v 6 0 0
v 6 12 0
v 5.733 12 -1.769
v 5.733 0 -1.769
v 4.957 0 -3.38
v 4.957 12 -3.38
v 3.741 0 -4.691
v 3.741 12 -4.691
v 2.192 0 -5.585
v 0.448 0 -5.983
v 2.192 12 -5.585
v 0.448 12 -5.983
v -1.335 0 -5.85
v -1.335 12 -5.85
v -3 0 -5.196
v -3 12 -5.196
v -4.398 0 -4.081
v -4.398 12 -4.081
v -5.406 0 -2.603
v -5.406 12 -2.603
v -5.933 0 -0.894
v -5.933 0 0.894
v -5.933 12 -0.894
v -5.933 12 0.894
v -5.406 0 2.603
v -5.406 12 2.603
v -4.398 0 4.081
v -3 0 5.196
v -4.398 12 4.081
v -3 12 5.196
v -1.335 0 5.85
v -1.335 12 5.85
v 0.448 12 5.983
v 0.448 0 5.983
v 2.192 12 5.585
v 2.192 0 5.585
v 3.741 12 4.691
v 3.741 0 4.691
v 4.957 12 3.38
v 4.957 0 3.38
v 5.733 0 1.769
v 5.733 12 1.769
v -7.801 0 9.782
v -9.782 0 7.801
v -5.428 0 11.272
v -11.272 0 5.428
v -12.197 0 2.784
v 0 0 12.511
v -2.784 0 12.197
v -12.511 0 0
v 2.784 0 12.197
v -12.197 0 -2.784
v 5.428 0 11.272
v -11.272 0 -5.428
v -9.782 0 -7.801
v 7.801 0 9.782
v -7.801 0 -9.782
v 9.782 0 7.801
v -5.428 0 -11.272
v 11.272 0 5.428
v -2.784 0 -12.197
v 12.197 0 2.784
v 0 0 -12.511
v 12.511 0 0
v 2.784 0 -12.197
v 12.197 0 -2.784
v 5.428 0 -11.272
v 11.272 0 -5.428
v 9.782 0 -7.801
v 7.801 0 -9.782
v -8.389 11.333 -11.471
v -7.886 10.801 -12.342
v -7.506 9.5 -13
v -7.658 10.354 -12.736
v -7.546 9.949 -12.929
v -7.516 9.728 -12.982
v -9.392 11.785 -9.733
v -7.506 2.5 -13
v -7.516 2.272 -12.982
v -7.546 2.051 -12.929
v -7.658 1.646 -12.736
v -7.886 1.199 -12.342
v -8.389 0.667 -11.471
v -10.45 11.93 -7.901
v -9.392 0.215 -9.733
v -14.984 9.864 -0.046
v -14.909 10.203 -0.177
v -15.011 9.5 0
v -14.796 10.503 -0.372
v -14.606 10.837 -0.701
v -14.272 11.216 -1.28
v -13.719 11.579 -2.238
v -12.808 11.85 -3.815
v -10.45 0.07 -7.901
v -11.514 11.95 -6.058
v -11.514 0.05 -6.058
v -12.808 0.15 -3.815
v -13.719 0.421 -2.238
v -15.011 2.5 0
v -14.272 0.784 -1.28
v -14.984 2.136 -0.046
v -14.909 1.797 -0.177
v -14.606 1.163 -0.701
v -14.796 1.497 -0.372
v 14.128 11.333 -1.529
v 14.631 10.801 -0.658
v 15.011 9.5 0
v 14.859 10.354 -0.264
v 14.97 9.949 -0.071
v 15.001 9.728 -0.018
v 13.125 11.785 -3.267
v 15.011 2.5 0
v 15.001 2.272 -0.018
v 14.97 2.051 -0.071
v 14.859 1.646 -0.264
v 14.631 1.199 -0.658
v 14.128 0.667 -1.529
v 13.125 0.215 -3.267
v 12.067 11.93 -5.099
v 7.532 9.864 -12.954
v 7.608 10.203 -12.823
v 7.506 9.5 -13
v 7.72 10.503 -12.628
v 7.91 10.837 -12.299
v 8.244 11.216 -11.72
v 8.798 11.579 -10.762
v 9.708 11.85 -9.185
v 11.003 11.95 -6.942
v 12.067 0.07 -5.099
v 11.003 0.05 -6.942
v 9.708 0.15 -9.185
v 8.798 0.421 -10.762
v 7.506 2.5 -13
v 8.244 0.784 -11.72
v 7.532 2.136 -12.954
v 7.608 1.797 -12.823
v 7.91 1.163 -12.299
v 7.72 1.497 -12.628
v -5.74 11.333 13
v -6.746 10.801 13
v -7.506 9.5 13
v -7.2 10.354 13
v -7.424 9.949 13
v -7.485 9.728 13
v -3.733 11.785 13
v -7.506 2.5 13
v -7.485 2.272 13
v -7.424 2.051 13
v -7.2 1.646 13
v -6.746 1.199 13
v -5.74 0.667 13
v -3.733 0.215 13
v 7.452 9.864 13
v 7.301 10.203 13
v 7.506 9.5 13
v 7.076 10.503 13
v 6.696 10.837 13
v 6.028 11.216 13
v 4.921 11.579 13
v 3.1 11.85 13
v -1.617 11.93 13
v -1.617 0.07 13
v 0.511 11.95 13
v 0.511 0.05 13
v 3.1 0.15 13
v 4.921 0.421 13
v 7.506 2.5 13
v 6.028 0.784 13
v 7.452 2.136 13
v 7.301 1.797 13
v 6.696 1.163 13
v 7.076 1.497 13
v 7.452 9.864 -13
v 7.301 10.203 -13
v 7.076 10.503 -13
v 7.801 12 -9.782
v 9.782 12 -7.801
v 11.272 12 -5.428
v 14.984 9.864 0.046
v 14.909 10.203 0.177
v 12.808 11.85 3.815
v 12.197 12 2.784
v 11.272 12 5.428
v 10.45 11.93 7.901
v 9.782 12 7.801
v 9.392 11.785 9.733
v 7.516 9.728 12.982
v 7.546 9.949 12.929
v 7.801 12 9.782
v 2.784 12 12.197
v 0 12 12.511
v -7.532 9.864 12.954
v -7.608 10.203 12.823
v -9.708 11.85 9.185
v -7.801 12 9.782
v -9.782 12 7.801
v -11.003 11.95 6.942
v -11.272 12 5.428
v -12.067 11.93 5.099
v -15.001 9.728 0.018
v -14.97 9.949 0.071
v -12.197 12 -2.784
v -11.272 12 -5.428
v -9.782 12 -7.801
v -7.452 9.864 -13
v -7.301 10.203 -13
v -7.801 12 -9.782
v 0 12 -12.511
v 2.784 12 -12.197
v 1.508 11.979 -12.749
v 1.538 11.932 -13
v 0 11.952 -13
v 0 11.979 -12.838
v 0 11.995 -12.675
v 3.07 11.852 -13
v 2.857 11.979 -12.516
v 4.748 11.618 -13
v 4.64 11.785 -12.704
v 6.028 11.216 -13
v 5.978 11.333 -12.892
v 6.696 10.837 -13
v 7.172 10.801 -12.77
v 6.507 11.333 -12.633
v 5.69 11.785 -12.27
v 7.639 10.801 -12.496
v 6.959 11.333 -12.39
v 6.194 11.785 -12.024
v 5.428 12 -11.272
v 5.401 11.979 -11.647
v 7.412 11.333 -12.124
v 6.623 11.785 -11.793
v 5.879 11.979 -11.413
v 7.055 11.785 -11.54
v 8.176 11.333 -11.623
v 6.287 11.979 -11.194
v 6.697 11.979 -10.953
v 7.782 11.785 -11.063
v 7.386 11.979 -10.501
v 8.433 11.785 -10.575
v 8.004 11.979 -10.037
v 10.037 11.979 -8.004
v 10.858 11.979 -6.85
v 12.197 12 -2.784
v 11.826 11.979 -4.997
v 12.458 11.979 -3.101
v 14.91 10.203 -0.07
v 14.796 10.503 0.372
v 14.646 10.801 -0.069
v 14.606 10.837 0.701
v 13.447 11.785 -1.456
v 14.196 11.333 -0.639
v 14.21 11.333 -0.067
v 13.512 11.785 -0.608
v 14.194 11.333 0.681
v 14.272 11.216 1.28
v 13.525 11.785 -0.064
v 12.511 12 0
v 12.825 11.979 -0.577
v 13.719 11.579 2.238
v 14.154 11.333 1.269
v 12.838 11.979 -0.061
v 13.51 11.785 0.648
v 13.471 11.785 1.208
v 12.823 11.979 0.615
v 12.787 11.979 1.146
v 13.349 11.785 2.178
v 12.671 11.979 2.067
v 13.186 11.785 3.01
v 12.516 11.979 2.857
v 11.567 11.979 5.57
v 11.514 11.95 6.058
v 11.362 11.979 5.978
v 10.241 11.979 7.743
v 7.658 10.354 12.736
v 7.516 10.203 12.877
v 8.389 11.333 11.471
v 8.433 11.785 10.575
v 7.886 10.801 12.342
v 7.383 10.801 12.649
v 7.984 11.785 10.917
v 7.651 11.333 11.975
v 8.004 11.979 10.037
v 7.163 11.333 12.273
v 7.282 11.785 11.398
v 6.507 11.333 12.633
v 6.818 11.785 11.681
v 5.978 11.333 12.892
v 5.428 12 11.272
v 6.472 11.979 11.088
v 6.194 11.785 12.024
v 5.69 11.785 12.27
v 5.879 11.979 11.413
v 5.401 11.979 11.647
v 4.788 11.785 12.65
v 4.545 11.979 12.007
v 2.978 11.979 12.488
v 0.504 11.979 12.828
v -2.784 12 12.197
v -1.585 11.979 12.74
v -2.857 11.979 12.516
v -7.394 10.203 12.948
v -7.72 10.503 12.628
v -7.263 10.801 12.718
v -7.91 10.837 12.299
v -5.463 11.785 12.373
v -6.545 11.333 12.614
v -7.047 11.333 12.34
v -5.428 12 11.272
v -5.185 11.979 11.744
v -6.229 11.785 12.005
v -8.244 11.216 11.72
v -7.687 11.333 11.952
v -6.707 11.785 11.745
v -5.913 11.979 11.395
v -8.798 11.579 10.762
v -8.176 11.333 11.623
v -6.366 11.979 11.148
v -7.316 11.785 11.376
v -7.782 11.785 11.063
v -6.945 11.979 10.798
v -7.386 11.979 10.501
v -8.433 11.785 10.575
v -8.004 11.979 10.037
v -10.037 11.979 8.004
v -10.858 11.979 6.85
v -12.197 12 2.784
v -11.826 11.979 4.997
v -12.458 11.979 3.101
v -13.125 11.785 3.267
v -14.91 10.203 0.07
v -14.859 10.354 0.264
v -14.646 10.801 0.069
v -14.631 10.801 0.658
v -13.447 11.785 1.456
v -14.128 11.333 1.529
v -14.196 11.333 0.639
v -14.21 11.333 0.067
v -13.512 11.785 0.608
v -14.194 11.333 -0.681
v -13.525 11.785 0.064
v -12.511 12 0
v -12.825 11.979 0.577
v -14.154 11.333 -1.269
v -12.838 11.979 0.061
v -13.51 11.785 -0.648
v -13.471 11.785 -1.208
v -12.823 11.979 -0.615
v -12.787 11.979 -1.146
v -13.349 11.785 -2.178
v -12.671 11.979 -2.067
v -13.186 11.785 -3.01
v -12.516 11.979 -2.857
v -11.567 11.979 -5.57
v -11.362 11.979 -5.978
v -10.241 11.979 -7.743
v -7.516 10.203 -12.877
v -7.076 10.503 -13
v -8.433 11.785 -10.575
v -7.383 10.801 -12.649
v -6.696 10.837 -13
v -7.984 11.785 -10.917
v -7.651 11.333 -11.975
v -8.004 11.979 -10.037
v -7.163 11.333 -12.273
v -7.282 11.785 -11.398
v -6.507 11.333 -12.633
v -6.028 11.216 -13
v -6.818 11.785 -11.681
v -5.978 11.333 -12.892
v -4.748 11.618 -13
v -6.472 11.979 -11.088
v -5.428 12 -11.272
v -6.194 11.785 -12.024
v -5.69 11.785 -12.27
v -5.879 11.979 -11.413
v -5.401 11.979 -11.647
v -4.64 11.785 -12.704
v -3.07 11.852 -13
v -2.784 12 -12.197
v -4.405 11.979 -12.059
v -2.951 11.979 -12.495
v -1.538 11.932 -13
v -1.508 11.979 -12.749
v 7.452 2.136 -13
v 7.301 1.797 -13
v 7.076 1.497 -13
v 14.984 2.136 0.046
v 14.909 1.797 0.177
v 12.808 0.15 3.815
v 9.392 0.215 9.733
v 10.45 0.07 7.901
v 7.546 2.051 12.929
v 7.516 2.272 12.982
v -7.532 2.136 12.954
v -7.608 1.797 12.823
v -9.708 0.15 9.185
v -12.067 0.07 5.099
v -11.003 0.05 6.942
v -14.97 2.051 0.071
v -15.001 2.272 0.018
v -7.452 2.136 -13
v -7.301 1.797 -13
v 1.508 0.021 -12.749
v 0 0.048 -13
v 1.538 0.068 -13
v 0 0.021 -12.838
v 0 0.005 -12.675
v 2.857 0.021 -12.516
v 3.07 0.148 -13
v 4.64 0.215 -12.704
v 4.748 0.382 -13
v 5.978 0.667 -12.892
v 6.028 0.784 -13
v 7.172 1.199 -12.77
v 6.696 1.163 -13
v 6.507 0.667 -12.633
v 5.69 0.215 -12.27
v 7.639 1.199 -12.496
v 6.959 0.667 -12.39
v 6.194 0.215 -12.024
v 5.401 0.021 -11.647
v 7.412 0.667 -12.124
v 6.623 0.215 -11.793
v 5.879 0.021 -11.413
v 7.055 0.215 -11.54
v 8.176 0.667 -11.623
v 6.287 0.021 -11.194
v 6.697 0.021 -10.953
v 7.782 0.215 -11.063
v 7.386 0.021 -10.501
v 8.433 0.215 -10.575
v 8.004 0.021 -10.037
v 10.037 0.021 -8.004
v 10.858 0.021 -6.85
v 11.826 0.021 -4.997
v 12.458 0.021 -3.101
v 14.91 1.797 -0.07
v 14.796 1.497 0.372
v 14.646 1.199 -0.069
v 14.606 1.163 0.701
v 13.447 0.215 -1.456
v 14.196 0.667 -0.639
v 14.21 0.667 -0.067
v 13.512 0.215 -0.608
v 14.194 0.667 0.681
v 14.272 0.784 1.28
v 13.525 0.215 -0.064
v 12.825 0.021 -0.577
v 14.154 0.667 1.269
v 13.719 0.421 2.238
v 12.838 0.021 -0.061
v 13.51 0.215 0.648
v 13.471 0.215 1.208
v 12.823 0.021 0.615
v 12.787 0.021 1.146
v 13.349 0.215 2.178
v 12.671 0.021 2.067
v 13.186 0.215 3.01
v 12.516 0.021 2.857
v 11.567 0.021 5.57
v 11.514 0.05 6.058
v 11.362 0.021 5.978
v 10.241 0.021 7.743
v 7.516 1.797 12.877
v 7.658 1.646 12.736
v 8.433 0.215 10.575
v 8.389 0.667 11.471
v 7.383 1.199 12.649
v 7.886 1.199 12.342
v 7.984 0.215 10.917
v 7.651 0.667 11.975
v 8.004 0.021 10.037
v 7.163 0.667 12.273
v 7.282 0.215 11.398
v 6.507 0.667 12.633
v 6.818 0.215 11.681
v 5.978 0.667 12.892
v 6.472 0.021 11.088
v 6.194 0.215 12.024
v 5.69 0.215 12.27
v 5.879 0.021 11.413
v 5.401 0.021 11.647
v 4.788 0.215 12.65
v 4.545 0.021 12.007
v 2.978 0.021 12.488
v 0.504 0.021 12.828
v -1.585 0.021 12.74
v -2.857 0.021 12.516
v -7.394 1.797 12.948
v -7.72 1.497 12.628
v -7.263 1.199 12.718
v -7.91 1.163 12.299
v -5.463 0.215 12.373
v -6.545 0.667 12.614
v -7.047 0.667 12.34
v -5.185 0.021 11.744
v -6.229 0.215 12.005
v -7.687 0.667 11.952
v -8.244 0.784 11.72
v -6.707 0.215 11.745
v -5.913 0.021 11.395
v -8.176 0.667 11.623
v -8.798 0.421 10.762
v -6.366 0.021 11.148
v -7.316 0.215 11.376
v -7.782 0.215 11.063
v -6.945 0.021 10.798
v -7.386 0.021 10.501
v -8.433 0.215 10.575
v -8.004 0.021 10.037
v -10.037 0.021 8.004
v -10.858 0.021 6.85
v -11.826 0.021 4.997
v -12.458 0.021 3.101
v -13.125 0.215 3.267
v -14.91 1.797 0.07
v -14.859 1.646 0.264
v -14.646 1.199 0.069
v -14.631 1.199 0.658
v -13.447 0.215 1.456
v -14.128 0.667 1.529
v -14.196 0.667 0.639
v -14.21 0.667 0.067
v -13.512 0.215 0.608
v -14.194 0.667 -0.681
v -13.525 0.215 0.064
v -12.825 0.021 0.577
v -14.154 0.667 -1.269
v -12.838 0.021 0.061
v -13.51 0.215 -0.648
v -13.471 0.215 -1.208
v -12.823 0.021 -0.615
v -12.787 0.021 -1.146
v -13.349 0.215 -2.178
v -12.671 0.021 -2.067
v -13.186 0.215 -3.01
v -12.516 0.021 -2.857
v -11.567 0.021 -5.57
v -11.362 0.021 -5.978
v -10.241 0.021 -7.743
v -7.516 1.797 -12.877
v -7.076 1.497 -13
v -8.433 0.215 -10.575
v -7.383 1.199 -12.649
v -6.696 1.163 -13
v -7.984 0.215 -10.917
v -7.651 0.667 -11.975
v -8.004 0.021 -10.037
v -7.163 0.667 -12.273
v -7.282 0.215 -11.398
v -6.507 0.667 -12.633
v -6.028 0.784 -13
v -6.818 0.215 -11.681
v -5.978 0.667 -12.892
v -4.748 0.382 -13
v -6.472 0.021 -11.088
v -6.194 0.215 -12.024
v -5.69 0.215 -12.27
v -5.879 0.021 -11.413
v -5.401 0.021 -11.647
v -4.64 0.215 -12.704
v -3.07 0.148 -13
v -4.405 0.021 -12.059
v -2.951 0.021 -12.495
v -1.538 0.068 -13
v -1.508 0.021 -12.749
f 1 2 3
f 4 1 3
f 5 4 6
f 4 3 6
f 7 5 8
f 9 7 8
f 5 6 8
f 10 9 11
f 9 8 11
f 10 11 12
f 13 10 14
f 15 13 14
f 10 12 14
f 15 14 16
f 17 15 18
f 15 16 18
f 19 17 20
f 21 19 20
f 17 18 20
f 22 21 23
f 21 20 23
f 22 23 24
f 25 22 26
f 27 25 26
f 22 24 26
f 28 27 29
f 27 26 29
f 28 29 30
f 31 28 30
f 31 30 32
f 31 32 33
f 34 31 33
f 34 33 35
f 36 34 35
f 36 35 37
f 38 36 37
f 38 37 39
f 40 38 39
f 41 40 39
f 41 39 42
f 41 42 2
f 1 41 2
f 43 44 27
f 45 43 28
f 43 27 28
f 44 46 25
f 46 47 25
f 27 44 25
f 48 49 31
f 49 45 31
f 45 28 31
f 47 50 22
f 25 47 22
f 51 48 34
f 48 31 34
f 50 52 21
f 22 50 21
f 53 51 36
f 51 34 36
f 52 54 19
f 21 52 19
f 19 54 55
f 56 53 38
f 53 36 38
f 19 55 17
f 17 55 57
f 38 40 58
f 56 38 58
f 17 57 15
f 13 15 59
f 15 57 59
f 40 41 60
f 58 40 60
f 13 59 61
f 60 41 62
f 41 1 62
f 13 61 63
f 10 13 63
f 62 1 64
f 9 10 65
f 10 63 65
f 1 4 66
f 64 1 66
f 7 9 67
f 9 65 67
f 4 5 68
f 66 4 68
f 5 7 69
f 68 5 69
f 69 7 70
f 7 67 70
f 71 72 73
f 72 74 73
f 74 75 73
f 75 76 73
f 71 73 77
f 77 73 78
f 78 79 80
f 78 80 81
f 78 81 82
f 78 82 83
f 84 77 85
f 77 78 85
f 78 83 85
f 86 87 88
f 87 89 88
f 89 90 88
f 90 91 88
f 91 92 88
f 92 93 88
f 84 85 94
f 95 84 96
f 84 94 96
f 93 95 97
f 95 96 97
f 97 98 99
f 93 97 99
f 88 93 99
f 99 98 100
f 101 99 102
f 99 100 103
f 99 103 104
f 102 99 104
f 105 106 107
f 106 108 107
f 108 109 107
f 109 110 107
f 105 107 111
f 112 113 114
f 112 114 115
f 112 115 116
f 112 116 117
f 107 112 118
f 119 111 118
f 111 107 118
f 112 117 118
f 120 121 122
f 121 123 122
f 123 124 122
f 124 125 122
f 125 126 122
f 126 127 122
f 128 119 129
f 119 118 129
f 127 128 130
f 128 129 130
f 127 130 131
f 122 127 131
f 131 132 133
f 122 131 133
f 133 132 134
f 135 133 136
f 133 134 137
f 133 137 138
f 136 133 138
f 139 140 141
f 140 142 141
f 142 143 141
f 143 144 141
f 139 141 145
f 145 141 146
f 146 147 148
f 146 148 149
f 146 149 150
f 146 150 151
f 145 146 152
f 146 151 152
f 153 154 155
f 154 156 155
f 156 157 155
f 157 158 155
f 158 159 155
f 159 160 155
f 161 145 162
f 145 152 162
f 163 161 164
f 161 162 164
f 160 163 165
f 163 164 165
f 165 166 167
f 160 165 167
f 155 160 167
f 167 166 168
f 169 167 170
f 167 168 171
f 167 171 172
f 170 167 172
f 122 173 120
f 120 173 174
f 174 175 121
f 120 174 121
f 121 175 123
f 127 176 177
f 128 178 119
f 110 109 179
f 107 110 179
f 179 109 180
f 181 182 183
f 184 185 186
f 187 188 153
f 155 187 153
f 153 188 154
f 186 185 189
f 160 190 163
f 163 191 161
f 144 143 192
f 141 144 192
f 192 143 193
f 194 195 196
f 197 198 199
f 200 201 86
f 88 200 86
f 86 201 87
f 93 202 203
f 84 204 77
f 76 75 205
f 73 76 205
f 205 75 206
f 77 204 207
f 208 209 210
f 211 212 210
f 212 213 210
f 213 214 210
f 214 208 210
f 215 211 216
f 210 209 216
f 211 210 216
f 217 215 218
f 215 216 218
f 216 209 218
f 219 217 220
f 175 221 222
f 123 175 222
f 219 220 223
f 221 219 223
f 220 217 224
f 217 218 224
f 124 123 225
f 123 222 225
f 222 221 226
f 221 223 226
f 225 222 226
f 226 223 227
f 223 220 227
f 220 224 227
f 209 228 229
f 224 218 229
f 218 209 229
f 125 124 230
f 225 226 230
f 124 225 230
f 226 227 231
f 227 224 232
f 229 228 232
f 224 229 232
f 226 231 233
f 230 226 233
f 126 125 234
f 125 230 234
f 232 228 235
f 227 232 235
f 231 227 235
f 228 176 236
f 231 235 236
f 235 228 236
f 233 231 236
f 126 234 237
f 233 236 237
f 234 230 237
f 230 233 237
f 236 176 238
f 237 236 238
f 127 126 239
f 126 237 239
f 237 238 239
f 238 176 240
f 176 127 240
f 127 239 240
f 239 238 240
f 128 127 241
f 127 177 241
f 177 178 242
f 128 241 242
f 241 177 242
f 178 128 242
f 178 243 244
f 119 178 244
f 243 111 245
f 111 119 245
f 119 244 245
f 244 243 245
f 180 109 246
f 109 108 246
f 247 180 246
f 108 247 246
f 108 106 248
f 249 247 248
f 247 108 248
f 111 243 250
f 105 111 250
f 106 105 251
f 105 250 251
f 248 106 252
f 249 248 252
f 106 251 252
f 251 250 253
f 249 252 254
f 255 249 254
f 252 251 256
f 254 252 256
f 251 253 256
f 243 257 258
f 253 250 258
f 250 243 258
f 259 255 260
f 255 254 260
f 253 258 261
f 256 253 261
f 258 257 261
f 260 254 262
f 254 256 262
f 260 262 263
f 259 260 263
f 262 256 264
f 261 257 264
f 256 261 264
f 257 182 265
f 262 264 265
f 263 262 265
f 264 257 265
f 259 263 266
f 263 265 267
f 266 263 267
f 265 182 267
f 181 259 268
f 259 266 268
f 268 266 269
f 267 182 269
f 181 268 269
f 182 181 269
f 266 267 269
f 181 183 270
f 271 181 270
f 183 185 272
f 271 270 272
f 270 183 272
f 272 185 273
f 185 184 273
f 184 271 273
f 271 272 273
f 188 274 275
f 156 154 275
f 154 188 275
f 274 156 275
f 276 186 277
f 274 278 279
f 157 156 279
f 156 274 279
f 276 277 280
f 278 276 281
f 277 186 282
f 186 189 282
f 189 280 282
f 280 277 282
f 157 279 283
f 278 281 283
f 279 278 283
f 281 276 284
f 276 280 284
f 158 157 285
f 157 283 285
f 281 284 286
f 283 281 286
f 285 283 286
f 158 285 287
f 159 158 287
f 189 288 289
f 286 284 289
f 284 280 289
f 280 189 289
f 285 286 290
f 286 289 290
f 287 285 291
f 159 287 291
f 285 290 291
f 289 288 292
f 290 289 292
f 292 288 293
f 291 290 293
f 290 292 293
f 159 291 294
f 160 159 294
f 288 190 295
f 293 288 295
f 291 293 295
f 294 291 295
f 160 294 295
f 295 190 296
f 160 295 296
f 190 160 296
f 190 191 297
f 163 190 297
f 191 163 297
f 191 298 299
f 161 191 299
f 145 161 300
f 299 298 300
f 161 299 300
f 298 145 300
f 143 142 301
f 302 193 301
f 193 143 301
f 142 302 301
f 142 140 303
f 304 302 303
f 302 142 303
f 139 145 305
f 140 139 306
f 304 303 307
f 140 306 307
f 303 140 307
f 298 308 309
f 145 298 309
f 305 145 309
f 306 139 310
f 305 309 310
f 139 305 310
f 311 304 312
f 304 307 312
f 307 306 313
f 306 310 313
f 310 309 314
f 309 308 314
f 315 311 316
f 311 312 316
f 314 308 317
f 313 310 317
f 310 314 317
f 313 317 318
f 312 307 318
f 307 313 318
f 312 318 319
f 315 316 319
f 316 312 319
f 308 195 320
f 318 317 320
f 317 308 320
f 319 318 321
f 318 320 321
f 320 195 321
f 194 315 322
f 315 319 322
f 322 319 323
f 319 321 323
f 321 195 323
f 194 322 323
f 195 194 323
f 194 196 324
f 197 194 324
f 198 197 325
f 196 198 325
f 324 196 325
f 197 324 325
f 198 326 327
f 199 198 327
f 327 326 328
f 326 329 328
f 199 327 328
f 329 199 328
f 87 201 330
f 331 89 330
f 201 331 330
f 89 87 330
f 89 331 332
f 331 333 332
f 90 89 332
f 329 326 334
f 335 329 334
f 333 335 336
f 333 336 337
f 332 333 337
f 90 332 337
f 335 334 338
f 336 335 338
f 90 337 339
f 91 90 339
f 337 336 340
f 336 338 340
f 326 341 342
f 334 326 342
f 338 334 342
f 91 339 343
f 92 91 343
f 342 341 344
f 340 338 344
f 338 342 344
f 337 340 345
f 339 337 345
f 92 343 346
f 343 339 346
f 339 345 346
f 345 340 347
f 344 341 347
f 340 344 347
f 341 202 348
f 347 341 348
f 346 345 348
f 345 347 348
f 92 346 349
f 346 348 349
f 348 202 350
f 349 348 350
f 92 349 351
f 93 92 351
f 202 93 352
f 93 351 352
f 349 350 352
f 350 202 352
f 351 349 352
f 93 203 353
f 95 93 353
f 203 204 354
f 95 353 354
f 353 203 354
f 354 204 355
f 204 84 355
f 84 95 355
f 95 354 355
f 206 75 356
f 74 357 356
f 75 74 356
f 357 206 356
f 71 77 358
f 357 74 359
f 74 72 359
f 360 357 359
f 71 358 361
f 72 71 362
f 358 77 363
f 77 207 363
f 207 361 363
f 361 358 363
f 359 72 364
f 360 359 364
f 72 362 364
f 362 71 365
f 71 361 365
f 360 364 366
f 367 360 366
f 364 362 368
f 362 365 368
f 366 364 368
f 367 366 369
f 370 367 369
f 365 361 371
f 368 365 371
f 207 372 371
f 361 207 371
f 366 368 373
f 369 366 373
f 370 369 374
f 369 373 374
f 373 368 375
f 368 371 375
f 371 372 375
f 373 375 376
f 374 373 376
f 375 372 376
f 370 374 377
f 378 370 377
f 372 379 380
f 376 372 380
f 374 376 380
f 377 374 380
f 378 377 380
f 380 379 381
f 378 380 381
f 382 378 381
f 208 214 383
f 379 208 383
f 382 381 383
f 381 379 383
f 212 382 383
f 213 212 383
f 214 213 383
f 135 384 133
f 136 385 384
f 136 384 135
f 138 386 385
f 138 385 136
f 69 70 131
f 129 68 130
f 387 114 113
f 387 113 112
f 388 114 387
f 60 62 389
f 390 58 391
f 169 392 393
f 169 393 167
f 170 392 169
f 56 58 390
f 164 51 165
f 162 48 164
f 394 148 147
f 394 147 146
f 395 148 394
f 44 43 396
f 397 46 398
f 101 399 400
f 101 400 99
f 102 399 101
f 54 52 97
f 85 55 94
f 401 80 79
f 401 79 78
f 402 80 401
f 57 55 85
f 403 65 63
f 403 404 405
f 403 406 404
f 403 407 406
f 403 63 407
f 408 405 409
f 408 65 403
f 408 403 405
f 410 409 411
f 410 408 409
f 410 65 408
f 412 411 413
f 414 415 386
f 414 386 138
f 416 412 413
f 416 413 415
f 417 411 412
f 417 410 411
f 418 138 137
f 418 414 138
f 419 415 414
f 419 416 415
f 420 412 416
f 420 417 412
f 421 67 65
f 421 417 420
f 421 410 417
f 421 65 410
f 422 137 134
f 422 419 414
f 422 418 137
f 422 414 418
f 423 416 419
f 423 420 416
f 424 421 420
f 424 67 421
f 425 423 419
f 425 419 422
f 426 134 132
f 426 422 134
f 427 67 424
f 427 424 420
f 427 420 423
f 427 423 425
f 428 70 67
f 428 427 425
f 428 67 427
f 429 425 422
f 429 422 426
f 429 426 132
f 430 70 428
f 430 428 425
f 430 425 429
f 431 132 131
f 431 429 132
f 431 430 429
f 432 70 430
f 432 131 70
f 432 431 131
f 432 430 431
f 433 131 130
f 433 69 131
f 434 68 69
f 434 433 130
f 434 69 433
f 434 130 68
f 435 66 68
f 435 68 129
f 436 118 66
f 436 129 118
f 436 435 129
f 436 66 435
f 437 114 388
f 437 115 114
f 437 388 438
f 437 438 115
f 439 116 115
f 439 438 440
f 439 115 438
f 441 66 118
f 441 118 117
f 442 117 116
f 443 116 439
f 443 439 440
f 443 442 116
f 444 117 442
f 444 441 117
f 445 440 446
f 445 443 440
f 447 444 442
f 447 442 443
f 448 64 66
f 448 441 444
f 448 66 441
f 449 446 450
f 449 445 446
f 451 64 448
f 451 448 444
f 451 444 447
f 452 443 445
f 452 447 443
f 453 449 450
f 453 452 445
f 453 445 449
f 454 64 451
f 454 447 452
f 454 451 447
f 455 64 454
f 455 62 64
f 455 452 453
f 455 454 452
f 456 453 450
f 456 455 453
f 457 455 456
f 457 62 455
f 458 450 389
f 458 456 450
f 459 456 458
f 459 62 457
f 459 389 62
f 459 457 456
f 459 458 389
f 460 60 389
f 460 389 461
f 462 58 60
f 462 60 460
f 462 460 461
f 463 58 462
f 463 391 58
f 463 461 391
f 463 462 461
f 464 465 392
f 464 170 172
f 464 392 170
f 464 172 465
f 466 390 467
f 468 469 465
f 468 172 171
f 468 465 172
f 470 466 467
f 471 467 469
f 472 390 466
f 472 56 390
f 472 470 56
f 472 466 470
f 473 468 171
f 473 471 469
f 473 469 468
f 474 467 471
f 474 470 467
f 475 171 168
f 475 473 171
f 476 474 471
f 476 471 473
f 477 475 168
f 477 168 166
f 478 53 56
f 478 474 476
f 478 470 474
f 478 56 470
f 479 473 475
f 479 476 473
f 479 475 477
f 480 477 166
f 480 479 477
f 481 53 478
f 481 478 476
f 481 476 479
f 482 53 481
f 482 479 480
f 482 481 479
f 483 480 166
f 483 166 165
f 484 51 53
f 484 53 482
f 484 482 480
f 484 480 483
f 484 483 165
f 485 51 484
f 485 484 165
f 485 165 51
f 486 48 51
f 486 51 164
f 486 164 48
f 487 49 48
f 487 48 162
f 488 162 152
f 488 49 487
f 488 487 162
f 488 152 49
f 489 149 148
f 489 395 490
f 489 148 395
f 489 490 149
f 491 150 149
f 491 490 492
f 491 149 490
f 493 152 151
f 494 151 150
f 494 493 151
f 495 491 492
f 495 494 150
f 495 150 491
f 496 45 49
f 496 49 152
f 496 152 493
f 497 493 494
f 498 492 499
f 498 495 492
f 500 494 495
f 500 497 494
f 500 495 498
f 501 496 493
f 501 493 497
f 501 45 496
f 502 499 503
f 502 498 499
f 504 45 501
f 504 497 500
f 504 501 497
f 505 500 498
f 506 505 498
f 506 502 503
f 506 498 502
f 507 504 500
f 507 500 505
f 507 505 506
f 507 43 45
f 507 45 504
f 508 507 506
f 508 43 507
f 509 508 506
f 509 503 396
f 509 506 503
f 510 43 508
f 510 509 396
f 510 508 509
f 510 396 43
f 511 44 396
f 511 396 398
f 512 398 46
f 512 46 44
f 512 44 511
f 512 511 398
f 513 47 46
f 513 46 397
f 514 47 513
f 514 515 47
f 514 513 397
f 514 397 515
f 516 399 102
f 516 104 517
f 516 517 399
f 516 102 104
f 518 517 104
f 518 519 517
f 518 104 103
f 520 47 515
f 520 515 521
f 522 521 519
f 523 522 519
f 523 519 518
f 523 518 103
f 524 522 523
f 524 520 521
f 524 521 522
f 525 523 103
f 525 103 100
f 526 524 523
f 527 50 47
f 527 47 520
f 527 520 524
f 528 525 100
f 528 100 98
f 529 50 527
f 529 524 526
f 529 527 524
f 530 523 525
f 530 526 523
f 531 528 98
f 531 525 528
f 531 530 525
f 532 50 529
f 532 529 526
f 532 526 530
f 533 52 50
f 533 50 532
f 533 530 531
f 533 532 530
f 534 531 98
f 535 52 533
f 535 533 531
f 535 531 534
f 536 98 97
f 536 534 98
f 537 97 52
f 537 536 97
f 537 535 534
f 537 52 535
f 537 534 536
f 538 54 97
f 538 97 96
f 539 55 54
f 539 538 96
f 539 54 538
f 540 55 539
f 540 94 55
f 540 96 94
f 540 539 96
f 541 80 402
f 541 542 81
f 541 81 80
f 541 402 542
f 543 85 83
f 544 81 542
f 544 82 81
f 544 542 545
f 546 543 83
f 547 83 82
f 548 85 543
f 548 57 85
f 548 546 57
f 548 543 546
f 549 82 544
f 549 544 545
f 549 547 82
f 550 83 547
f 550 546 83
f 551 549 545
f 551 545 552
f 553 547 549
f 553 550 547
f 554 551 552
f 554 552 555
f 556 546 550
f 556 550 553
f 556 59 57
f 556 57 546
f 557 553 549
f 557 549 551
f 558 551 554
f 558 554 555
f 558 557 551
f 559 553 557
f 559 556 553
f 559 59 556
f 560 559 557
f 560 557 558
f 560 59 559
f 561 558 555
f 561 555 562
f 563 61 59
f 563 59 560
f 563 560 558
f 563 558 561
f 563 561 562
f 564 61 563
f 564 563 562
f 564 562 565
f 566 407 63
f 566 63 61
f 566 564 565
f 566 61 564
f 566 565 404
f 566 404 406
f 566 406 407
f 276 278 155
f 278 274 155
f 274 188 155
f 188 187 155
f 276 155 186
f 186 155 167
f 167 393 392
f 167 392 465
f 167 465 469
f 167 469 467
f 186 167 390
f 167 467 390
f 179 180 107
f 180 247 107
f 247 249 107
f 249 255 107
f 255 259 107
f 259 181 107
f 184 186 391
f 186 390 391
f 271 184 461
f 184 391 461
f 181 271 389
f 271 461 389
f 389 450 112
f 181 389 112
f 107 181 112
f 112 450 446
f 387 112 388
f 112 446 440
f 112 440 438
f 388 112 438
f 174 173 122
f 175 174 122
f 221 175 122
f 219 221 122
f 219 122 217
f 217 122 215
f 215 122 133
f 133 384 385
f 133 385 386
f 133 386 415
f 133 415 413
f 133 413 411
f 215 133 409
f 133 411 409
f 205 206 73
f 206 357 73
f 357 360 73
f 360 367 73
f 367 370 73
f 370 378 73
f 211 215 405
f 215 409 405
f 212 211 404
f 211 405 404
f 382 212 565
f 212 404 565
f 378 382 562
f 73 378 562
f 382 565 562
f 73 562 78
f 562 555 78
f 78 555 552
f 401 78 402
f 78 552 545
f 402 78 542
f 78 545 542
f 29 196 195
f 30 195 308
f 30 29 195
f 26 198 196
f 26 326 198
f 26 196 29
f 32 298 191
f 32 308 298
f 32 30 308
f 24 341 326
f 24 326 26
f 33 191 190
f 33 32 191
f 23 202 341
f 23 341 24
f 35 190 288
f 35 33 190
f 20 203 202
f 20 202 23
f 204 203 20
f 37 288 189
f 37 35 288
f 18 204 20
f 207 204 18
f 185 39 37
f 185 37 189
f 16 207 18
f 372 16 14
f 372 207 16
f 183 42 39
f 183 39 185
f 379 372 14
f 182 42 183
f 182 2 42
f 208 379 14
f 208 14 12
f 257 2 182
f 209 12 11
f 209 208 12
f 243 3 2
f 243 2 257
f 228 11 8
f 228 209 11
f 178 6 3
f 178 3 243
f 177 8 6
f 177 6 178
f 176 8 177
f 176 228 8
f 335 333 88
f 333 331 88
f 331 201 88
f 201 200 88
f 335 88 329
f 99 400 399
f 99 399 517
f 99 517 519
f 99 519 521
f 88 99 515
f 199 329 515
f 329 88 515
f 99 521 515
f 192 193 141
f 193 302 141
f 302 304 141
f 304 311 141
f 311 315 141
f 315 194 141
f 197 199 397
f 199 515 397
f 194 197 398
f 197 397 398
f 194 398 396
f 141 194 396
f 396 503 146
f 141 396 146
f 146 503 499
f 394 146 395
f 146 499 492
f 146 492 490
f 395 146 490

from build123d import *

# Parameters (mm, degrees)
BOSS_EXTRUDE1_DEPTH    = 12
F_12_0MM_DOWEL_HOLE1_D = 12


with BuildPart() as part:
    # Sketch1 → Boss-Extrude1 (new body)
    with BuildSketch(Plane(origin=(0, 0, 0), x_dir=(1, 0, 0), z_dir=(0, 1, 0))):
        Polygon((7.505553499, 13), (-7.505553499, 13), (-15.011106999, 0), (-7.505553499, -13), (7.505553499, -13), (15.011106999, 0), align=None)
    extrude(amount=BOSS_EXTRUDE1_DEPTH)

    # Ø12.0mm Dowel Hole1 (through all)
    with Locations(Plane(origin=(0, 0, 0), x_dir=(-1, 0, 0), z_dir=(0, -1, 0))):
        with Locations((0, 0)):
            Hole(F_12_0MM_DOWEL_HOLE1_D / 2)

    # Sketch4 → Cut-Revolve2 (revolve, cut)
    with BuildSketch(Plane.XY, mode=Mode.PRIVATE) as cut_revolve2_sk:
        with BuildLine():
            Line((19.381381373, -4.532480394), (19.381381373, 2.5))
            Line((19.381381373, 2.5), (15.011106999, 2.5))
            ThreePointArc((15.011106999, 2.5), (14.278873952, 0.732233047), (12.511106999, 0))
            Line((12.511106999, 0), (12.511106999, -4.532480394))
            Line((12.511106999, -4.532480394), (19.381381373, -4.532480394))
        make_face()
    cut_revolve2 = revolve(cut_revolve2_sk.sketch.rotate(Axis((0, 14.406395282, 0), (0, -1, 0)), 270), axis=Axis((0, 14.406395282, 0), (0, -1, 0)), mode=Mode.SUBTRACT)

    # Mirror1: Cut-Revolve2 across plane
    add(cut_revolve2.mirror(Plane(origin=(0, 6, 0), x_dir=(0, 0, 1), z_dir=(0, -1, 0))), mode=Mode.SUBTRACT)


solid = part.part
